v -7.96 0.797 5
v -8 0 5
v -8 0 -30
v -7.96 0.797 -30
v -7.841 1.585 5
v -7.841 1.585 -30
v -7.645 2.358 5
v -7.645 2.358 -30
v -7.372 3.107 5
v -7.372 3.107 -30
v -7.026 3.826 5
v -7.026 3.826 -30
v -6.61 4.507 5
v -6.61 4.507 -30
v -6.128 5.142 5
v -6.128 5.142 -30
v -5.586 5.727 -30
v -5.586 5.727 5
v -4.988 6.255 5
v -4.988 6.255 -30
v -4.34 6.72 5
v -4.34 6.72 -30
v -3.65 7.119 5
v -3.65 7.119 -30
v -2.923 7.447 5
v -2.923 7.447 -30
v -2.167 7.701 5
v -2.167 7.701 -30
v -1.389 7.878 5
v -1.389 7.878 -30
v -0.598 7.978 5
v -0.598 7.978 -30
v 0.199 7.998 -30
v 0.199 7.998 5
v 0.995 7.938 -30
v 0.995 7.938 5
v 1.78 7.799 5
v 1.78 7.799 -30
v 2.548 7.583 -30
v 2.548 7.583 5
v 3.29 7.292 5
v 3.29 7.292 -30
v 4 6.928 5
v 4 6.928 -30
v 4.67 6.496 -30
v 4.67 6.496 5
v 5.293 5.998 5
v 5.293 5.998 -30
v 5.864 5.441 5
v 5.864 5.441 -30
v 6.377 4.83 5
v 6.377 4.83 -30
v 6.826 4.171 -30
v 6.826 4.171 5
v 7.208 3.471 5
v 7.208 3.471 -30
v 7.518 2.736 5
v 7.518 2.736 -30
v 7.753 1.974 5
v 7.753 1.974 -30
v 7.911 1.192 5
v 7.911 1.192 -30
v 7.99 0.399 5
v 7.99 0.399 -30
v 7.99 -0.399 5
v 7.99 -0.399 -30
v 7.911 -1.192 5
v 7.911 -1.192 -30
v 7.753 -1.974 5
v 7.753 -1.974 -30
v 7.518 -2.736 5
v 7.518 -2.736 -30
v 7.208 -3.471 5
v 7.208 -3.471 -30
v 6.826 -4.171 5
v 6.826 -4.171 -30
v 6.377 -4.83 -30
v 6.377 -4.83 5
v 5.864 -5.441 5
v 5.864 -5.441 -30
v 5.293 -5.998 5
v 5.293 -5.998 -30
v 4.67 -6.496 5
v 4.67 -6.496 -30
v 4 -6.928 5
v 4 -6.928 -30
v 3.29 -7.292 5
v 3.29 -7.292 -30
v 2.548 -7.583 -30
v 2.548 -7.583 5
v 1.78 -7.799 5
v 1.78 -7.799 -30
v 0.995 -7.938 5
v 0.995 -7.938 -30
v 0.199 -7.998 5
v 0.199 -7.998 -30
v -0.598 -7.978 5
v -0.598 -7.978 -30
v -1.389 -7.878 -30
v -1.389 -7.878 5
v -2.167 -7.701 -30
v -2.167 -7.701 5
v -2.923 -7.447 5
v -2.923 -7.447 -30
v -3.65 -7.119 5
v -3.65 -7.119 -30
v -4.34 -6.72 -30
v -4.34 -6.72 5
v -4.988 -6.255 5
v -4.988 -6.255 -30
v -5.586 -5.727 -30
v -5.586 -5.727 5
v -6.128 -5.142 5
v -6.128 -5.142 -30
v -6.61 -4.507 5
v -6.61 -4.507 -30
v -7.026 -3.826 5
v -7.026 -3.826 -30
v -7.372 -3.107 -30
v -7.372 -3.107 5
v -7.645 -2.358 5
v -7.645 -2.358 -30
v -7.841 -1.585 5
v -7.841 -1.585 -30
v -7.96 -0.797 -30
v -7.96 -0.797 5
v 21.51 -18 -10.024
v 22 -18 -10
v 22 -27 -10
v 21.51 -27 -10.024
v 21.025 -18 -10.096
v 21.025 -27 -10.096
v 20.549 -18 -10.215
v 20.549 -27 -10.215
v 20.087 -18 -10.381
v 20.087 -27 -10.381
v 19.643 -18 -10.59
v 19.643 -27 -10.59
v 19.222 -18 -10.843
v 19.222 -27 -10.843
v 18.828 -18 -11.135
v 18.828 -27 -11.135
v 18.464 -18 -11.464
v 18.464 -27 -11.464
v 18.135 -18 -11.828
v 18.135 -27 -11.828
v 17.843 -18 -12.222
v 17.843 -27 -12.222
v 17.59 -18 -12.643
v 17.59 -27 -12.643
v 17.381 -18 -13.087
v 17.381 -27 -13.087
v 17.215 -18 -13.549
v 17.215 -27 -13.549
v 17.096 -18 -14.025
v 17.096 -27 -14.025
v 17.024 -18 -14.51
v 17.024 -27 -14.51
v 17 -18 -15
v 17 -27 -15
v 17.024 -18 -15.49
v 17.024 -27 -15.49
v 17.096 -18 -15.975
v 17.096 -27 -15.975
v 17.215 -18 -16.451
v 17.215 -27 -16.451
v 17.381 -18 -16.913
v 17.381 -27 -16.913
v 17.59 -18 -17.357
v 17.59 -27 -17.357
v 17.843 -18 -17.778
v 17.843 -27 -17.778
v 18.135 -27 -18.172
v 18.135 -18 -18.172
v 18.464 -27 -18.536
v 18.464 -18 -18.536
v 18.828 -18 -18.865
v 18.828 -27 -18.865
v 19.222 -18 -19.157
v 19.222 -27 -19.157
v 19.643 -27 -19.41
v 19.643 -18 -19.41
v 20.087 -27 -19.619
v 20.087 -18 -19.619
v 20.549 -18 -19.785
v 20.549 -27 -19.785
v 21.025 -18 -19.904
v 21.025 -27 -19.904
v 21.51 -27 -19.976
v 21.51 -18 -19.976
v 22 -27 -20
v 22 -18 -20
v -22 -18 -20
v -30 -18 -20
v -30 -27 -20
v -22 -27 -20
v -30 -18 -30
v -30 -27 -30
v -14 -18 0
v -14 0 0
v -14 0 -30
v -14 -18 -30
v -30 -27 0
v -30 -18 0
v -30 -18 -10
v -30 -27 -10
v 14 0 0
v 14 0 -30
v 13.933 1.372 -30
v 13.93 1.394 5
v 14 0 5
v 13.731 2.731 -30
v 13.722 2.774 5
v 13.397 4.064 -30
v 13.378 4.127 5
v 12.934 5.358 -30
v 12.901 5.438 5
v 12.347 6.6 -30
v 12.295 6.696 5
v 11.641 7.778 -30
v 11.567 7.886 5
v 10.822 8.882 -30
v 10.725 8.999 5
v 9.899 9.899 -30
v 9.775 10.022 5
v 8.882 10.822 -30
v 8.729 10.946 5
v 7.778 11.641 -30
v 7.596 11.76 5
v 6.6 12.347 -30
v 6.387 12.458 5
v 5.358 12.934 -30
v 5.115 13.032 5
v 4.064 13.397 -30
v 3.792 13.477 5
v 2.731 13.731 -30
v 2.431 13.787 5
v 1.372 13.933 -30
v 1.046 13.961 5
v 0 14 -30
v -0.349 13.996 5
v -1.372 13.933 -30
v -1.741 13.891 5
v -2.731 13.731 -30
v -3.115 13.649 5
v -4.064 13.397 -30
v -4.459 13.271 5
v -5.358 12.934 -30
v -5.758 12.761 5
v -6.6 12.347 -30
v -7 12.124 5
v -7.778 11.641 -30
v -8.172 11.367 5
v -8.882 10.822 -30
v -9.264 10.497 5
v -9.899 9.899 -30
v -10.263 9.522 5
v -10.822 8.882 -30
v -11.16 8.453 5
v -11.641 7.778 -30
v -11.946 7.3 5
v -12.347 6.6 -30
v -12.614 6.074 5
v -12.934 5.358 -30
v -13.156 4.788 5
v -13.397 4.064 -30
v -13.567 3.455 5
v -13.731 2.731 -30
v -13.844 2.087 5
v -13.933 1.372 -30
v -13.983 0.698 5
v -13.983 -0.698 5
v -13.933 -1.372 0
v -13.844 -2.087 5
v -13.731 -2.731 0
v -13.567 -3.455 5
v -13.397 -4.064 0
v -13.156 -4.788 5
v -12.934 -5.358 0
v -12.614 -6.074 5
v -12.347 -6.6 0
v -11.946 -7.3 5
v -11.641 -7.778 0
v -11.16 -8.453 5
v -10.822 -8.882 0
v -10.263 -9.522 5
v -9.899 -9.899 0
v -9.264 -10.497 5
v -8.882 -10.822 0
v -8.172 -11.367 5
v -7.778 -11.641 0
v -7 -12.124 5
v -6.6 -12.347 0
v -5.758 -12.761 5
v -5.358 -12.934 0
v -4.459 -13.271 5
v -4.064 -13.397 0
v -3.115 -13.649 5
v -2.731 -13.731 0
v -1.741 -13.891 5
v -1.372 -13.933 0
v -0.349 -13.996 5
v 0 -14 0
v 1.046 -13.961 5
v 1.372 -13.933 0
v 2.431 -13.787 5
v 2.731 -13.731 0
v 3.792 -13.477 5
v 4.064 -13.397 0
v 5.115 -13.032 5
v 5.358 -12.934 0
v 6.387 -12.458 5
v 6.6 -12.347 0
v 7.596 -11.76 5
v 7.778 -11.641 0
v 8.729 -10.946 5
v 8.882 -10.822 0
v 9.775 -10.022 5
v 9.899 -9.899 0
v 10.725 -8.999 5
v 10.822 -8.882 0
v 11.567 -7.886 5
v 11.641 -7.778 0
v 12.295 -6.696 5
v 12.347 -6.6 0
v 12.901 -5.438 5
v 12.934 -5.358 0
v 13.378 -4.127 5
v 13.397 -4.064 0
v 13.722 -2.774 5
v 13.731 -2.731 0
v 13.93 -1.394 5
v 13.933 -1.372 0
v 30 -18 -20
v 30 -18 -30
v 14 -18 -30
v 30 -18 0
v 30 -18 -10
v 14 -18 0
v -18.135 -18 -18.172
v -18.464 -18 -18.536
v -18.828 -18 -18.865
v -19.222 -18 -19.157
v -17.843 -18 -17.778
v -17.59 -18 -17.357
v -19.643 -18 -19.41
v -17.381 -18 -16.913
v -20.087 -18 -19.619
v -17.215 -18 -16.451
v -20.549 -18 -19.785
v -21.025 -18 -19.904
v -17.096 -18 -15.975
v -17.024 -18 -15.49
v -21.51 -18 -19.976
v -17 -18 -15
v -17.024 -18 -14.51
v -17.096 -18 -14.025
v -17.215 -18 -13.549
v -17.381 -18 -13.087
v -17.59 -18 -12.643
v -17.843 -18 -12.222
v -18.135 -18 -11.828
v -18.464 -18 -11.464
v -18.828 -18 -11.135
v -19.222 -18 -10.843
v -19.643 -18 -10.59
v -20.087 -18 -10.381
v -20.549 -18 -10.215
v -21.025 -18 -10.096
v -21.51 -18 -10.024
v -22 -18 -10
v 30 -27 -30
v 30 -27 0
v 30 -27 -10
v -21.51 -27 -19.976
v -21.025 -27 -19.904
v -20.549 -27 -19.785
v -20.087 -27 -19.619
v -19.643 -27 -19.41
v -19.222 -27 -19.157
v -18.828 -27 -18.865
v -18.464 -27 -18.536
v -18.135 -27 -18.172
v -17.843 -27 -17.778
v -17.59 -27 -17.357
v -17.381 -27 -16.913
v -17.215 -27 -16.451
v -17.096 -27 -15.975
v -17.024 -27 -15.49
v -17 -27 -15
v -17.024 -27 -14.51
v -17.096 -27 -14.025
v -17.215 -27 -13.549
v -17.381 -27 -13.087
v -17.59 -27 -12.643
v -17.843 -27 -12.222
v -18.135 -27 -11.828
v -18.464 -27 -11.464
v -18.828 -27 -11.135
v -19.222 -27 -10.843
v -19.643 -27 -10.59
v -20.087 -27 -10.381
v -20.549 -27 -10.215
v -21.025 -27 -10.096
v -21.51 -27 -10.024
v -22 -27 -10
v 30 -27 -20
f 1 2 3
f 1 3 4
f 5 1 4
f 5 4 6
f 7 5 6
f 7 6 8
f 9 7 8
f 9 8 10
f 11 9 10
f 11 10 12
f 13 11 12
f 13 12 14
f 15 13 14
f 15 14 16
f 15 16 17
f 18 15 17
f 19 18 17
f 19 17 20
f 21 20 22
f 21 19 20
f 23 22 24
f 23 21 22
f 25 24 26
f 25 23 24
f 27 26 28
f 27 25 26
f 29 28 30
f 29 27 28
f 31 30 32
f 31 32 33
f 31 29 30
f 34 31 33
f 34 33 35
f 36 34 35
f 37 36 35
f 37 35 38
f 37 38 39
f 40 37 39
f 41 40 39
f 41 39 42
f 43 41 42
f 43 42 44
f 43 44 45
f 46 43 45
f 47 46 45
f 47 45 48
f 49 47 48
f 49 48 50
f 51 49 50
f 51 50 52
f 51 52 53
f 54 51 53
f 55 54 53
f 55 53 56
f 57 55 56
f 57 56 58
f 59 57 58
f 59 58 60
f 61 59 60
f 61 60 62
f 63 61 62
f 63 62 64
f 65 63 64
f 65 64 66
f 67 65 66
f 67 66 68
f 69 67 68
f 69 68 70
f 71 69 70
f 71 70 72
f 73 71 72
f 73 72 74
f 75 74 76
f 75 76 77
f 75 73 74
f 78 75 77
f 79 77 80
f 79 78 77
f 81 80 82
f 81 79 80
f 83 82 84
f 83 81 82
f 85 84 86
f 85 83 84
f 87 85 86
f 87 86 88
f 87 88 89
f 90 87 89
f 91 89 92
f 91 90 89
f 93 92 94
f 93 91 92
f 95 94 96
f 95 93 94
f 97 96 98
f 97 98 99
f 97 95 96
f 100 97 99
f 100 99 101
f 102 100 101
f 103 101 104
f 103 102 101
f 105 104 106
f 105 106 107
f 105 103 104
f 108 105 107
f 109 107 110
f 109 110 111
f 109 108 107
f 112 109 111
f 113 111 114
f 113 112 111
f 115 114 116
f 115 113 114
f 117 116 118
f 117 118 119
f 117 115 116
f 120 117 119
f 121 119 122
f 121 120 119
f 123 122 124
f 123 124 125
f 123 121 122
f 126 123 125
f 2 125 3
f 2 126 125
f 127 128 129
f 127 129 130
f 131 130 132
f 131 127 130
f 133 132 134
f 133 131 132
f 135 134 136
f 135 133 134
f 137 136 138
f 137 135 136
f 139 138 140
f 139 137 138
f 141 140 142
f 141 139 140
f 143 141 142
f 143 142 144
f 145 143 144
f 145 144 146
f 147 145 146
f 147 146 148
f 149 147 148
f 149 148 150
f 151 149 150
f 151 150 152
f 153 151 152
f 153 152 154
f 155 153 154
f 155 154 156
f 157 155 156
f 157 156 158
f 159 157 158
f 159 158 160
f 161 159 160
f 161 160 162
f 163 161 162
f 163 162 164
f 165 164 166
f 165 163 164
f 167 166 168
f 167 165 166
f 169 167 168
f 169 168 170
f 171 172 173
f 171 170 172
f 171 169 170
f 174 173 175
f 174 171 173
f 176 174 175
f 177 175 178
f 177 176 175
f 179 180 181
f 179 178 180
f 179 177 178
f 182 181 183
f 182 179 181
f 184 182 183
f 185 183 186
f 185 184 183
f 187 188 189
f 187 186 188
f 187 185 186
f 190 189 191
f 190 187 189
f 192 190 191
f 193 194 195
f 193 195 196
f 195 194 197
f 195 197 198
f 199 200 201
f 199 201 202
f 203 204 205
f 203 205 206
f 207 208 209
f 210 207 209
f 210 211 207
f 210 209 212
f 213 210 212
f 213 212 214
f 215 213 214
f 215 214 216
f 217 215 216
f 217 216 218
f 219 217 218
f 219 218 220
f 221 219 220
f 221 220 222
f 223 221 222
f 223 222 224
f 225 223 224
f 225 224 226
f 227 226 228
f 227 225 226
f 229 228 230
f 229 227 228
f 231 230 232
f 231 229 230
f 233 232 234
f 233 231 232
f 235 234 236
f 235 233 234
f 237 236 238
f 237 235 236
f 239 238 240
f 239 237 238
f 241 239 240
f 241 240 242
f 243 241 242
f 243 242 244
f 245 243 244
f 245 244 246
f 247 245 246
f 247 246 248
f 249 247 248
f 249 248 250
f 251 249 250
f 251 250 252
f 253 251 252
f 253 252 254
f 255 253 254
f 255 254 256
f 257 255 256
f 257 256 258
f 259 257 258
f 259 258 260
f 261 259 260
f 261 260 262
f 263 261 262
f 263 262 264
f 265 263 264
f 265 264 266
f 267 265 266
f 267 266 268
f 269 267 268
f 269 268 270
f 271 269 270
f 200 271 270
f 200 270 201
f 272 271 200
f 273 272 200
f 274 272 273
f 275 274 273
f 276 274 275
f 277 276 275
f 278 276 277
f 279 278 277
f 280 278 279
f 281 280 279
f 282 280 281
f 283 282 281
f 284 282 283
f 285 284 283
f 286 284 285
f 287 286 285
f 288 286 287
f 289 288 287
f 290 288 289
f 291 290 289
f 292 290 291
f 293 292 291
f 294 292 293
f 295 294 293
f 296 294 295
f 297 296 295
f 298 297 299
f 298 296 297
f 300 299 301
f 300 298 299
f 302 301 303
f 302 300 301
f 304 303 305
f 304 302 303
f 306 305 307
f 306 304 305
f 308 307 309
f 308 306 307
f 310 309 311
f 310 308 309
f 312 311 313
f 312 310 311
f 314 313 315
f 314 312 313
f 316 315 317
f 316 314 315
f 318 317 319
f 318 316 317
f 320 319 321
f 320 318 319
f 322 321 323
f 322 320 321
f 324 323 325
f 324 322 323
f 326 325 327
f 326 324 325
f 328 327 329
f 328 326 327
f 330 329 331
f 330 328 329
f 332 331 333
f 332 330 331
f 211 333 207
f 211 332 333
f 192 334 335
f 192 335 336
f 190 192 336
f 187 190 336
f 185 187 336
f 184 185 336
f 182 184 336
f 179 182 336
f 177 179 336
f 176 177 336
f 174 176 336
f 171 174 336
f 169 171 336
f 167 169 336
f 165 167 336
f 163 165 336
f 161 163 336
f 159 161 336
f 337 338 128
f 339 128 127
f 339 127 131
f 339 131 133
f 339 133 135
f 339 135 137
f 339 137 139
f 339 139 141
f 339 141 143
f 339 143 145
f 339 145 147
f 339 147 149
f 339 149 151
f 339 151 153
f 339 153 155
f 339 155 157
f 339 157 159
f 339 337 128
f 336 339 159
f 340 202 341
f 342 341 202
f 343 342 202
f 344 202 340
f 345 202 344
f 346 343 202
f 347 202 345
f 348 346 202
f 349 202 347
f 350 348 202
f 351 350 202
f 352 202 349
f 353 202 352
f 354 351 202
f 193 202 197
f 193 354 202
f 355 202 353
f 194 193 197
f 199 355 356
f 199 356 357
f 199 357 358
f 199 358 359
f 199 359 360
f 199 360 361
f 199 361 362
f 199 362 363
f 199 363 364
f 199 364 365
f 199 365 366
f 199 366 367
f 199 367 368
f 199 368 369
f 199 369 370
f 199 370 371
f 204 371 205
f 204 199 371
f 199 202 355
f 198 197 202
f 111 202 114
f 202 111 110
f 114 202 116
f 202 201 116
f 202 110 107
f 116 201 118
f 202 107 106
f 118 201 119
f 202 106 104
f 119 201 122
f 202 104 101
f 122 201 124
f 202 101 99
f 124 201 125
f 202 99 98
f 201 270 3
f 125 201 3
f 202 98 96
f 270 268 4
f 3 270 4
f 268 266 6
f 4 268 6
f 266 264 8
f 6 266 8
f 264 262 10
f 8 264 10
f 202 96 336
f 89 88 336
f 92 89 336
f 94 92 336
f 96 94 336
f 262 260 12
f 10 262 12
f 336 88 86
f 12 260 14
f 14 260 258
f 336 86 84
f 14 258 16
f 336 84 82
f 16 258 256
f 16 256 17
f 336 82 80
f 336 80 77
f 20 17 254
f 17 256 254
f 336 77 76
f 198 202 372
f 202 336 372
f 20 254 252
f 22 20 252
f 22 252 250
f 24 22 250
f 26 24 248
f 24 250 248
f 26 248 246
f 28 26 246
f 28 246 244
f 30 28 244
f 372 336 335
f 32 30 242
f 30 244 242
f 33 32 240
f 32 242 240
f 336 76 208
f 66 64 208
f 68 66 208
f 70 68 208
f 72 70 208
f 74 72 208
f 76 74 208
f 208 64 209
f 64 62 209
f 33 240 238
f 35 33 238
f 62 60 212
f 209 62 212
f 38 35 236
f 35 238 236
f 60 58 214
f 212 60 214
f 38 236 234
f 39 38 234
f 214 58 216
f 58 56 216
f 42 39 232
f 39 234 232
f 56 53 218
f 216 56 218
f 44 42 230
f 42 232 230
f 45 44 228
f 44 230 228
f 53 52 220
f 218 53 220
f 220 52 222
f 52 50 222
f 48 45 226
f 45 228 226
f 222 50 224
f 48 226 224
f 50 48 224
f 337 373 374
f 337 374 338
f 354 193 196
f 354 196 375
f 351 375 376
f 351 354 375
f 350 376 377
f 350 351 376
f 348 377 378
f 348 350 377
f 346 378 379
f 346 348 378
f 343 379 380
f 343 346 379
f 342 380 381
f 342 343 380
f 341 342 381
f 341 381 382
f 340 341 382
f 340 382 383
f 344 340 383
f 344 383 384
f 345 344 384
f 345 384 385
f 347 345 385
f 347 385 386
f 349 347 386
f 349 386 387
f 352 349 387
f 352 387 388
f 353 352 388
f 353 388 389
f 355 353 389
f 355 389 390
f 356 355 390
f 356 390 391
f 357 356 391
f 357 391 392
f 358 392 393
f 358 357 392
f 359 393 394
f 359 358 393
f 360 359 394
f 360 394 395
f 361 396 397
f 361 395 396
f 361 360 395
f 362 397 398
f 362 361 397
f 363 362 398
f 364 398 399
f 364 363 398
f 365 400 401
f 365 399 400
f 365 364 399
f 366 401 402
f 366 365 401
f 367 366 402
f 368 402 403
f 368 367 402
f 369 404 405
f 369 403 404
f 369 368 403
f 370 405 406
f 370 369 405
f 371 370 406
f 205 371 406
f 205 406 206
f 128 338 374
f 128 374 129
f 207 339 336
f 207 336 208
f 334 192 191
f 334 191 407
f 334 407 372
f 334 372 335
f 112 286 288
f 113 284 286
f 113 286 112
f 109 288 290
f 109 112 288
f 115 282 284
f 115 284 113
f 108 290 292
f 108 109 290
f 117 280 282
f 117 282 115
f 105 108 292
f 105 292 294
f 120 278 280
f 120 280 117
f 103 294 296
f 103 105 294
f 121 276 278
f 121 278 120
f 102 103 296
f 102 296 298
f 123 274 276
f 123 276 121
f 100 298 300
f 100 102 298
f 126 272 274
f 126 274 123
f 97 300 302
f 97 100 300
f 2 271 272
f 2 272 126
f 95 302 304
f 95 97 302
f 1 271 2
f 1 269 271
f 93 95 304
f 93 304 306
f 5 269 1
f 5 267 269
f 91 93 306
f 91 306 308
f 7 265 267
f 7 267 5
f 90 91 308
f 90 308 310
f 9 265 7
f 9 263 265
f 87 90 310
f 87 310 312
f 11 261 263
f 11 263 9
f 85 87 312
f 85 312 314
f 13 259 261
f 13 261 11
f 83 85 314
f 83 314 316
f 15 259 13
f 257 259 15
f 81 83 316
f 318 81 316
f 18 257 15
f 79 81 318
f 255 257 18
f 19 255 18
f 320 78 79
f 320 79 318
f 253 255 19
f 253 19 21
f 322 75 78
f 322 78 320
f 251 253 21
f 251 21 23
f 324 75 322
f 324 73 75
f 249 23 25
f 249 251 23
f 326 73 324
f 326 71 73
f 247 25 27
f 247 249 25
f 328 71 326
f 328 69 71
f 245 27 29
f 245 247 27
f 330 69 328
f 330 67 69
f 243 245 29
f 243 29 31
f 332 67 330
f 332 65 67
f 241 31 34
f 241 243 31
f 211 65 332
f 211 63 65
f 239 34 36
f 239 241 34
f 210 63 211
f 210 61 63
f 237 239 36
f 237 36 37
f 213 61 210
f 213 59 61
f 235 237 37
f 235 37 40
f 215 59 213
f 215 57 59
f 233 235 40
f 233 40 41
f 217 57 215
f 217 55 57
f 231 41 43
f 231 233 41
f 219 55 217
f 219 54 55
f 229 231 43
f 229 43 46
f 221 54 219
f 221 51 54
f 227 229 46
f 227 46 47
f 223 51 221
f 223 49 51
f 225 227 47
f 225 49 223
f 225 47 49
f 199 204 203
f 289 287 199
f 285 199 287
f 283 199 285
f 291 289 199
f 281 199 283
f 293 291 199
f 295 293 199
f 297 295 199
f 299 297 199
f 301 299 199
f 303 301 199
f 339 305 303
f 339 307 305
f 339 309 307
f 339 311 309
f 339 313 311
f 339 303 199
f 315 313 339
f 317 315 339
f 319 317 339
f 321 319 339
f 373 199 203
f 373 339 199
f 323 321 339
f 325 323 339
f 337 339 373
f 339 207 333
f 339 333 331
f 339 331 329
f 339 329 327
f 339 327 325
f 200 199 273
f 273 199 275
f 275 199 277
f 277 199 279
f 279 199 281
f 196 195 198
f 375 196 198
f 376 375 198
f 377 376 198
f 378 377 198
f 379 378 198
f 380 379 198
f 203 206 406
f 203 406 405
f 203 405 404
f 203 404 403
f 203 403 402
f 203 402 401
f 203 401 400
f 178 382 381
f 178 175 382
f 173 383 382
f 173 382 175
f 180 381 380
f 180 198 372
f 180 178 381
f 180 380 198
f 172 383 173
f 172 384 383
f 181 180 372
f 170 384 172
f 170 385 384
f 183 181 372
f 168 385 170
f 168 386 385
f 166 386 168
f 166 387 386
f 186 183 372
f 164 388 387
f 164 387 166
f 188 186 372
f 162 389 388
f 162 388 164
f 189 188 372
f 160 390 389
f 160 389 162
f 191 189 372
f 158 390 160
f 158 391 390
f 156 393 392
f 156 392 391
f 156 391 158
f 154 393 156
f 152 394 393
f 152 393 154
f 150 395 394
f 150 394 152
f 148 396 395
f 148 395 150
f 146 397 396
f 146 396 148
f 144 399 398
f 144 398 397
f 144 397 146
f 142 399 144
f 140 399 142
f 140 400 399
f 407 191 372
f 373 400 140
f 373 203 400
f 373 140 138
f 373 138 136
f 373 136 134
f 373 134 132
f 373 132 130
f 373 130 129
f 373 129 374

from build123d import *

# Parameters (mm, degrees)
SKETCH_1_R          = 8
EXTRUDE_1_DEPTH     = 30
EXTRUDE_START       = 5
SKETCH_1_3_R        = 14
SKETCH_1_3_R_2      = 8
EXTRUDE_2_DEPTH     = 5
CUT_EXTRUDE_1_DEPTH = 54.141321022


with BuildPart() as part:
    # 草图1 → 凸台-拉伸1 (new body)
    with BuildSketch(Plane.XY):
        with BuildLine():
            Line((30, -18), (14, -18))
            Line((14, -18), (14, 0))
            ThreePointArc((14, 0), (0, 14), (-14, 0))
            Line((-14, 0), (-14, -18))
            Line((-14, -18), (-30, -18))
            Line((-30, -18), (-30, -27))
            Line((-30, -27), (30, -27))
            Line((30, -27), (30, -18))
        make_face()
        Circle(SKETCH_1_R, mode=Mode.SUBTRACT)
    extrude(amount=-EXTRUDE_1_DEPTH)

    # 草图1<3> → 凸台-拉伸2 (add)
    with BuildSketch(Plane.XY.offset(EXTRUDE_START)):
        Circle(SKETCH_1_3_R)
        Circle(SKETCH_1_3_R_2, mode=Mode.SUBTRACT)
    extrude(amount=-EXTRUDE_2_DEPTH)

    # 草图2 → 切除-拉伸1 (cut, through all)
    with BuildSketch(Plane(origin=(0, -18, 0), x_dir=(1, 0, 0), z_dir=(0, 1, 0))):
        with BuildLine():
            Line((30, 10), (22, 10))
            ThreePointArc((22, 10), (17, 15), (22, 20))
            Line((22, 20), (30, 20))
            Line((30, 20), (30, 10))
        make_face()
        with BuildLine():
            Line((-30, 20), (-22, 20))
            ThreePointArc((-22, 20), (-17, 15), (-22, 10))
            Line((-22, 10), (-30, 10))
            Line((-30, 10), (-30, 20))
        make_face()
    extrude(amount=-CUT_EXTRUDE_1_DEPTH, mode=Mode.SUBTRACT)


solid = part.part
